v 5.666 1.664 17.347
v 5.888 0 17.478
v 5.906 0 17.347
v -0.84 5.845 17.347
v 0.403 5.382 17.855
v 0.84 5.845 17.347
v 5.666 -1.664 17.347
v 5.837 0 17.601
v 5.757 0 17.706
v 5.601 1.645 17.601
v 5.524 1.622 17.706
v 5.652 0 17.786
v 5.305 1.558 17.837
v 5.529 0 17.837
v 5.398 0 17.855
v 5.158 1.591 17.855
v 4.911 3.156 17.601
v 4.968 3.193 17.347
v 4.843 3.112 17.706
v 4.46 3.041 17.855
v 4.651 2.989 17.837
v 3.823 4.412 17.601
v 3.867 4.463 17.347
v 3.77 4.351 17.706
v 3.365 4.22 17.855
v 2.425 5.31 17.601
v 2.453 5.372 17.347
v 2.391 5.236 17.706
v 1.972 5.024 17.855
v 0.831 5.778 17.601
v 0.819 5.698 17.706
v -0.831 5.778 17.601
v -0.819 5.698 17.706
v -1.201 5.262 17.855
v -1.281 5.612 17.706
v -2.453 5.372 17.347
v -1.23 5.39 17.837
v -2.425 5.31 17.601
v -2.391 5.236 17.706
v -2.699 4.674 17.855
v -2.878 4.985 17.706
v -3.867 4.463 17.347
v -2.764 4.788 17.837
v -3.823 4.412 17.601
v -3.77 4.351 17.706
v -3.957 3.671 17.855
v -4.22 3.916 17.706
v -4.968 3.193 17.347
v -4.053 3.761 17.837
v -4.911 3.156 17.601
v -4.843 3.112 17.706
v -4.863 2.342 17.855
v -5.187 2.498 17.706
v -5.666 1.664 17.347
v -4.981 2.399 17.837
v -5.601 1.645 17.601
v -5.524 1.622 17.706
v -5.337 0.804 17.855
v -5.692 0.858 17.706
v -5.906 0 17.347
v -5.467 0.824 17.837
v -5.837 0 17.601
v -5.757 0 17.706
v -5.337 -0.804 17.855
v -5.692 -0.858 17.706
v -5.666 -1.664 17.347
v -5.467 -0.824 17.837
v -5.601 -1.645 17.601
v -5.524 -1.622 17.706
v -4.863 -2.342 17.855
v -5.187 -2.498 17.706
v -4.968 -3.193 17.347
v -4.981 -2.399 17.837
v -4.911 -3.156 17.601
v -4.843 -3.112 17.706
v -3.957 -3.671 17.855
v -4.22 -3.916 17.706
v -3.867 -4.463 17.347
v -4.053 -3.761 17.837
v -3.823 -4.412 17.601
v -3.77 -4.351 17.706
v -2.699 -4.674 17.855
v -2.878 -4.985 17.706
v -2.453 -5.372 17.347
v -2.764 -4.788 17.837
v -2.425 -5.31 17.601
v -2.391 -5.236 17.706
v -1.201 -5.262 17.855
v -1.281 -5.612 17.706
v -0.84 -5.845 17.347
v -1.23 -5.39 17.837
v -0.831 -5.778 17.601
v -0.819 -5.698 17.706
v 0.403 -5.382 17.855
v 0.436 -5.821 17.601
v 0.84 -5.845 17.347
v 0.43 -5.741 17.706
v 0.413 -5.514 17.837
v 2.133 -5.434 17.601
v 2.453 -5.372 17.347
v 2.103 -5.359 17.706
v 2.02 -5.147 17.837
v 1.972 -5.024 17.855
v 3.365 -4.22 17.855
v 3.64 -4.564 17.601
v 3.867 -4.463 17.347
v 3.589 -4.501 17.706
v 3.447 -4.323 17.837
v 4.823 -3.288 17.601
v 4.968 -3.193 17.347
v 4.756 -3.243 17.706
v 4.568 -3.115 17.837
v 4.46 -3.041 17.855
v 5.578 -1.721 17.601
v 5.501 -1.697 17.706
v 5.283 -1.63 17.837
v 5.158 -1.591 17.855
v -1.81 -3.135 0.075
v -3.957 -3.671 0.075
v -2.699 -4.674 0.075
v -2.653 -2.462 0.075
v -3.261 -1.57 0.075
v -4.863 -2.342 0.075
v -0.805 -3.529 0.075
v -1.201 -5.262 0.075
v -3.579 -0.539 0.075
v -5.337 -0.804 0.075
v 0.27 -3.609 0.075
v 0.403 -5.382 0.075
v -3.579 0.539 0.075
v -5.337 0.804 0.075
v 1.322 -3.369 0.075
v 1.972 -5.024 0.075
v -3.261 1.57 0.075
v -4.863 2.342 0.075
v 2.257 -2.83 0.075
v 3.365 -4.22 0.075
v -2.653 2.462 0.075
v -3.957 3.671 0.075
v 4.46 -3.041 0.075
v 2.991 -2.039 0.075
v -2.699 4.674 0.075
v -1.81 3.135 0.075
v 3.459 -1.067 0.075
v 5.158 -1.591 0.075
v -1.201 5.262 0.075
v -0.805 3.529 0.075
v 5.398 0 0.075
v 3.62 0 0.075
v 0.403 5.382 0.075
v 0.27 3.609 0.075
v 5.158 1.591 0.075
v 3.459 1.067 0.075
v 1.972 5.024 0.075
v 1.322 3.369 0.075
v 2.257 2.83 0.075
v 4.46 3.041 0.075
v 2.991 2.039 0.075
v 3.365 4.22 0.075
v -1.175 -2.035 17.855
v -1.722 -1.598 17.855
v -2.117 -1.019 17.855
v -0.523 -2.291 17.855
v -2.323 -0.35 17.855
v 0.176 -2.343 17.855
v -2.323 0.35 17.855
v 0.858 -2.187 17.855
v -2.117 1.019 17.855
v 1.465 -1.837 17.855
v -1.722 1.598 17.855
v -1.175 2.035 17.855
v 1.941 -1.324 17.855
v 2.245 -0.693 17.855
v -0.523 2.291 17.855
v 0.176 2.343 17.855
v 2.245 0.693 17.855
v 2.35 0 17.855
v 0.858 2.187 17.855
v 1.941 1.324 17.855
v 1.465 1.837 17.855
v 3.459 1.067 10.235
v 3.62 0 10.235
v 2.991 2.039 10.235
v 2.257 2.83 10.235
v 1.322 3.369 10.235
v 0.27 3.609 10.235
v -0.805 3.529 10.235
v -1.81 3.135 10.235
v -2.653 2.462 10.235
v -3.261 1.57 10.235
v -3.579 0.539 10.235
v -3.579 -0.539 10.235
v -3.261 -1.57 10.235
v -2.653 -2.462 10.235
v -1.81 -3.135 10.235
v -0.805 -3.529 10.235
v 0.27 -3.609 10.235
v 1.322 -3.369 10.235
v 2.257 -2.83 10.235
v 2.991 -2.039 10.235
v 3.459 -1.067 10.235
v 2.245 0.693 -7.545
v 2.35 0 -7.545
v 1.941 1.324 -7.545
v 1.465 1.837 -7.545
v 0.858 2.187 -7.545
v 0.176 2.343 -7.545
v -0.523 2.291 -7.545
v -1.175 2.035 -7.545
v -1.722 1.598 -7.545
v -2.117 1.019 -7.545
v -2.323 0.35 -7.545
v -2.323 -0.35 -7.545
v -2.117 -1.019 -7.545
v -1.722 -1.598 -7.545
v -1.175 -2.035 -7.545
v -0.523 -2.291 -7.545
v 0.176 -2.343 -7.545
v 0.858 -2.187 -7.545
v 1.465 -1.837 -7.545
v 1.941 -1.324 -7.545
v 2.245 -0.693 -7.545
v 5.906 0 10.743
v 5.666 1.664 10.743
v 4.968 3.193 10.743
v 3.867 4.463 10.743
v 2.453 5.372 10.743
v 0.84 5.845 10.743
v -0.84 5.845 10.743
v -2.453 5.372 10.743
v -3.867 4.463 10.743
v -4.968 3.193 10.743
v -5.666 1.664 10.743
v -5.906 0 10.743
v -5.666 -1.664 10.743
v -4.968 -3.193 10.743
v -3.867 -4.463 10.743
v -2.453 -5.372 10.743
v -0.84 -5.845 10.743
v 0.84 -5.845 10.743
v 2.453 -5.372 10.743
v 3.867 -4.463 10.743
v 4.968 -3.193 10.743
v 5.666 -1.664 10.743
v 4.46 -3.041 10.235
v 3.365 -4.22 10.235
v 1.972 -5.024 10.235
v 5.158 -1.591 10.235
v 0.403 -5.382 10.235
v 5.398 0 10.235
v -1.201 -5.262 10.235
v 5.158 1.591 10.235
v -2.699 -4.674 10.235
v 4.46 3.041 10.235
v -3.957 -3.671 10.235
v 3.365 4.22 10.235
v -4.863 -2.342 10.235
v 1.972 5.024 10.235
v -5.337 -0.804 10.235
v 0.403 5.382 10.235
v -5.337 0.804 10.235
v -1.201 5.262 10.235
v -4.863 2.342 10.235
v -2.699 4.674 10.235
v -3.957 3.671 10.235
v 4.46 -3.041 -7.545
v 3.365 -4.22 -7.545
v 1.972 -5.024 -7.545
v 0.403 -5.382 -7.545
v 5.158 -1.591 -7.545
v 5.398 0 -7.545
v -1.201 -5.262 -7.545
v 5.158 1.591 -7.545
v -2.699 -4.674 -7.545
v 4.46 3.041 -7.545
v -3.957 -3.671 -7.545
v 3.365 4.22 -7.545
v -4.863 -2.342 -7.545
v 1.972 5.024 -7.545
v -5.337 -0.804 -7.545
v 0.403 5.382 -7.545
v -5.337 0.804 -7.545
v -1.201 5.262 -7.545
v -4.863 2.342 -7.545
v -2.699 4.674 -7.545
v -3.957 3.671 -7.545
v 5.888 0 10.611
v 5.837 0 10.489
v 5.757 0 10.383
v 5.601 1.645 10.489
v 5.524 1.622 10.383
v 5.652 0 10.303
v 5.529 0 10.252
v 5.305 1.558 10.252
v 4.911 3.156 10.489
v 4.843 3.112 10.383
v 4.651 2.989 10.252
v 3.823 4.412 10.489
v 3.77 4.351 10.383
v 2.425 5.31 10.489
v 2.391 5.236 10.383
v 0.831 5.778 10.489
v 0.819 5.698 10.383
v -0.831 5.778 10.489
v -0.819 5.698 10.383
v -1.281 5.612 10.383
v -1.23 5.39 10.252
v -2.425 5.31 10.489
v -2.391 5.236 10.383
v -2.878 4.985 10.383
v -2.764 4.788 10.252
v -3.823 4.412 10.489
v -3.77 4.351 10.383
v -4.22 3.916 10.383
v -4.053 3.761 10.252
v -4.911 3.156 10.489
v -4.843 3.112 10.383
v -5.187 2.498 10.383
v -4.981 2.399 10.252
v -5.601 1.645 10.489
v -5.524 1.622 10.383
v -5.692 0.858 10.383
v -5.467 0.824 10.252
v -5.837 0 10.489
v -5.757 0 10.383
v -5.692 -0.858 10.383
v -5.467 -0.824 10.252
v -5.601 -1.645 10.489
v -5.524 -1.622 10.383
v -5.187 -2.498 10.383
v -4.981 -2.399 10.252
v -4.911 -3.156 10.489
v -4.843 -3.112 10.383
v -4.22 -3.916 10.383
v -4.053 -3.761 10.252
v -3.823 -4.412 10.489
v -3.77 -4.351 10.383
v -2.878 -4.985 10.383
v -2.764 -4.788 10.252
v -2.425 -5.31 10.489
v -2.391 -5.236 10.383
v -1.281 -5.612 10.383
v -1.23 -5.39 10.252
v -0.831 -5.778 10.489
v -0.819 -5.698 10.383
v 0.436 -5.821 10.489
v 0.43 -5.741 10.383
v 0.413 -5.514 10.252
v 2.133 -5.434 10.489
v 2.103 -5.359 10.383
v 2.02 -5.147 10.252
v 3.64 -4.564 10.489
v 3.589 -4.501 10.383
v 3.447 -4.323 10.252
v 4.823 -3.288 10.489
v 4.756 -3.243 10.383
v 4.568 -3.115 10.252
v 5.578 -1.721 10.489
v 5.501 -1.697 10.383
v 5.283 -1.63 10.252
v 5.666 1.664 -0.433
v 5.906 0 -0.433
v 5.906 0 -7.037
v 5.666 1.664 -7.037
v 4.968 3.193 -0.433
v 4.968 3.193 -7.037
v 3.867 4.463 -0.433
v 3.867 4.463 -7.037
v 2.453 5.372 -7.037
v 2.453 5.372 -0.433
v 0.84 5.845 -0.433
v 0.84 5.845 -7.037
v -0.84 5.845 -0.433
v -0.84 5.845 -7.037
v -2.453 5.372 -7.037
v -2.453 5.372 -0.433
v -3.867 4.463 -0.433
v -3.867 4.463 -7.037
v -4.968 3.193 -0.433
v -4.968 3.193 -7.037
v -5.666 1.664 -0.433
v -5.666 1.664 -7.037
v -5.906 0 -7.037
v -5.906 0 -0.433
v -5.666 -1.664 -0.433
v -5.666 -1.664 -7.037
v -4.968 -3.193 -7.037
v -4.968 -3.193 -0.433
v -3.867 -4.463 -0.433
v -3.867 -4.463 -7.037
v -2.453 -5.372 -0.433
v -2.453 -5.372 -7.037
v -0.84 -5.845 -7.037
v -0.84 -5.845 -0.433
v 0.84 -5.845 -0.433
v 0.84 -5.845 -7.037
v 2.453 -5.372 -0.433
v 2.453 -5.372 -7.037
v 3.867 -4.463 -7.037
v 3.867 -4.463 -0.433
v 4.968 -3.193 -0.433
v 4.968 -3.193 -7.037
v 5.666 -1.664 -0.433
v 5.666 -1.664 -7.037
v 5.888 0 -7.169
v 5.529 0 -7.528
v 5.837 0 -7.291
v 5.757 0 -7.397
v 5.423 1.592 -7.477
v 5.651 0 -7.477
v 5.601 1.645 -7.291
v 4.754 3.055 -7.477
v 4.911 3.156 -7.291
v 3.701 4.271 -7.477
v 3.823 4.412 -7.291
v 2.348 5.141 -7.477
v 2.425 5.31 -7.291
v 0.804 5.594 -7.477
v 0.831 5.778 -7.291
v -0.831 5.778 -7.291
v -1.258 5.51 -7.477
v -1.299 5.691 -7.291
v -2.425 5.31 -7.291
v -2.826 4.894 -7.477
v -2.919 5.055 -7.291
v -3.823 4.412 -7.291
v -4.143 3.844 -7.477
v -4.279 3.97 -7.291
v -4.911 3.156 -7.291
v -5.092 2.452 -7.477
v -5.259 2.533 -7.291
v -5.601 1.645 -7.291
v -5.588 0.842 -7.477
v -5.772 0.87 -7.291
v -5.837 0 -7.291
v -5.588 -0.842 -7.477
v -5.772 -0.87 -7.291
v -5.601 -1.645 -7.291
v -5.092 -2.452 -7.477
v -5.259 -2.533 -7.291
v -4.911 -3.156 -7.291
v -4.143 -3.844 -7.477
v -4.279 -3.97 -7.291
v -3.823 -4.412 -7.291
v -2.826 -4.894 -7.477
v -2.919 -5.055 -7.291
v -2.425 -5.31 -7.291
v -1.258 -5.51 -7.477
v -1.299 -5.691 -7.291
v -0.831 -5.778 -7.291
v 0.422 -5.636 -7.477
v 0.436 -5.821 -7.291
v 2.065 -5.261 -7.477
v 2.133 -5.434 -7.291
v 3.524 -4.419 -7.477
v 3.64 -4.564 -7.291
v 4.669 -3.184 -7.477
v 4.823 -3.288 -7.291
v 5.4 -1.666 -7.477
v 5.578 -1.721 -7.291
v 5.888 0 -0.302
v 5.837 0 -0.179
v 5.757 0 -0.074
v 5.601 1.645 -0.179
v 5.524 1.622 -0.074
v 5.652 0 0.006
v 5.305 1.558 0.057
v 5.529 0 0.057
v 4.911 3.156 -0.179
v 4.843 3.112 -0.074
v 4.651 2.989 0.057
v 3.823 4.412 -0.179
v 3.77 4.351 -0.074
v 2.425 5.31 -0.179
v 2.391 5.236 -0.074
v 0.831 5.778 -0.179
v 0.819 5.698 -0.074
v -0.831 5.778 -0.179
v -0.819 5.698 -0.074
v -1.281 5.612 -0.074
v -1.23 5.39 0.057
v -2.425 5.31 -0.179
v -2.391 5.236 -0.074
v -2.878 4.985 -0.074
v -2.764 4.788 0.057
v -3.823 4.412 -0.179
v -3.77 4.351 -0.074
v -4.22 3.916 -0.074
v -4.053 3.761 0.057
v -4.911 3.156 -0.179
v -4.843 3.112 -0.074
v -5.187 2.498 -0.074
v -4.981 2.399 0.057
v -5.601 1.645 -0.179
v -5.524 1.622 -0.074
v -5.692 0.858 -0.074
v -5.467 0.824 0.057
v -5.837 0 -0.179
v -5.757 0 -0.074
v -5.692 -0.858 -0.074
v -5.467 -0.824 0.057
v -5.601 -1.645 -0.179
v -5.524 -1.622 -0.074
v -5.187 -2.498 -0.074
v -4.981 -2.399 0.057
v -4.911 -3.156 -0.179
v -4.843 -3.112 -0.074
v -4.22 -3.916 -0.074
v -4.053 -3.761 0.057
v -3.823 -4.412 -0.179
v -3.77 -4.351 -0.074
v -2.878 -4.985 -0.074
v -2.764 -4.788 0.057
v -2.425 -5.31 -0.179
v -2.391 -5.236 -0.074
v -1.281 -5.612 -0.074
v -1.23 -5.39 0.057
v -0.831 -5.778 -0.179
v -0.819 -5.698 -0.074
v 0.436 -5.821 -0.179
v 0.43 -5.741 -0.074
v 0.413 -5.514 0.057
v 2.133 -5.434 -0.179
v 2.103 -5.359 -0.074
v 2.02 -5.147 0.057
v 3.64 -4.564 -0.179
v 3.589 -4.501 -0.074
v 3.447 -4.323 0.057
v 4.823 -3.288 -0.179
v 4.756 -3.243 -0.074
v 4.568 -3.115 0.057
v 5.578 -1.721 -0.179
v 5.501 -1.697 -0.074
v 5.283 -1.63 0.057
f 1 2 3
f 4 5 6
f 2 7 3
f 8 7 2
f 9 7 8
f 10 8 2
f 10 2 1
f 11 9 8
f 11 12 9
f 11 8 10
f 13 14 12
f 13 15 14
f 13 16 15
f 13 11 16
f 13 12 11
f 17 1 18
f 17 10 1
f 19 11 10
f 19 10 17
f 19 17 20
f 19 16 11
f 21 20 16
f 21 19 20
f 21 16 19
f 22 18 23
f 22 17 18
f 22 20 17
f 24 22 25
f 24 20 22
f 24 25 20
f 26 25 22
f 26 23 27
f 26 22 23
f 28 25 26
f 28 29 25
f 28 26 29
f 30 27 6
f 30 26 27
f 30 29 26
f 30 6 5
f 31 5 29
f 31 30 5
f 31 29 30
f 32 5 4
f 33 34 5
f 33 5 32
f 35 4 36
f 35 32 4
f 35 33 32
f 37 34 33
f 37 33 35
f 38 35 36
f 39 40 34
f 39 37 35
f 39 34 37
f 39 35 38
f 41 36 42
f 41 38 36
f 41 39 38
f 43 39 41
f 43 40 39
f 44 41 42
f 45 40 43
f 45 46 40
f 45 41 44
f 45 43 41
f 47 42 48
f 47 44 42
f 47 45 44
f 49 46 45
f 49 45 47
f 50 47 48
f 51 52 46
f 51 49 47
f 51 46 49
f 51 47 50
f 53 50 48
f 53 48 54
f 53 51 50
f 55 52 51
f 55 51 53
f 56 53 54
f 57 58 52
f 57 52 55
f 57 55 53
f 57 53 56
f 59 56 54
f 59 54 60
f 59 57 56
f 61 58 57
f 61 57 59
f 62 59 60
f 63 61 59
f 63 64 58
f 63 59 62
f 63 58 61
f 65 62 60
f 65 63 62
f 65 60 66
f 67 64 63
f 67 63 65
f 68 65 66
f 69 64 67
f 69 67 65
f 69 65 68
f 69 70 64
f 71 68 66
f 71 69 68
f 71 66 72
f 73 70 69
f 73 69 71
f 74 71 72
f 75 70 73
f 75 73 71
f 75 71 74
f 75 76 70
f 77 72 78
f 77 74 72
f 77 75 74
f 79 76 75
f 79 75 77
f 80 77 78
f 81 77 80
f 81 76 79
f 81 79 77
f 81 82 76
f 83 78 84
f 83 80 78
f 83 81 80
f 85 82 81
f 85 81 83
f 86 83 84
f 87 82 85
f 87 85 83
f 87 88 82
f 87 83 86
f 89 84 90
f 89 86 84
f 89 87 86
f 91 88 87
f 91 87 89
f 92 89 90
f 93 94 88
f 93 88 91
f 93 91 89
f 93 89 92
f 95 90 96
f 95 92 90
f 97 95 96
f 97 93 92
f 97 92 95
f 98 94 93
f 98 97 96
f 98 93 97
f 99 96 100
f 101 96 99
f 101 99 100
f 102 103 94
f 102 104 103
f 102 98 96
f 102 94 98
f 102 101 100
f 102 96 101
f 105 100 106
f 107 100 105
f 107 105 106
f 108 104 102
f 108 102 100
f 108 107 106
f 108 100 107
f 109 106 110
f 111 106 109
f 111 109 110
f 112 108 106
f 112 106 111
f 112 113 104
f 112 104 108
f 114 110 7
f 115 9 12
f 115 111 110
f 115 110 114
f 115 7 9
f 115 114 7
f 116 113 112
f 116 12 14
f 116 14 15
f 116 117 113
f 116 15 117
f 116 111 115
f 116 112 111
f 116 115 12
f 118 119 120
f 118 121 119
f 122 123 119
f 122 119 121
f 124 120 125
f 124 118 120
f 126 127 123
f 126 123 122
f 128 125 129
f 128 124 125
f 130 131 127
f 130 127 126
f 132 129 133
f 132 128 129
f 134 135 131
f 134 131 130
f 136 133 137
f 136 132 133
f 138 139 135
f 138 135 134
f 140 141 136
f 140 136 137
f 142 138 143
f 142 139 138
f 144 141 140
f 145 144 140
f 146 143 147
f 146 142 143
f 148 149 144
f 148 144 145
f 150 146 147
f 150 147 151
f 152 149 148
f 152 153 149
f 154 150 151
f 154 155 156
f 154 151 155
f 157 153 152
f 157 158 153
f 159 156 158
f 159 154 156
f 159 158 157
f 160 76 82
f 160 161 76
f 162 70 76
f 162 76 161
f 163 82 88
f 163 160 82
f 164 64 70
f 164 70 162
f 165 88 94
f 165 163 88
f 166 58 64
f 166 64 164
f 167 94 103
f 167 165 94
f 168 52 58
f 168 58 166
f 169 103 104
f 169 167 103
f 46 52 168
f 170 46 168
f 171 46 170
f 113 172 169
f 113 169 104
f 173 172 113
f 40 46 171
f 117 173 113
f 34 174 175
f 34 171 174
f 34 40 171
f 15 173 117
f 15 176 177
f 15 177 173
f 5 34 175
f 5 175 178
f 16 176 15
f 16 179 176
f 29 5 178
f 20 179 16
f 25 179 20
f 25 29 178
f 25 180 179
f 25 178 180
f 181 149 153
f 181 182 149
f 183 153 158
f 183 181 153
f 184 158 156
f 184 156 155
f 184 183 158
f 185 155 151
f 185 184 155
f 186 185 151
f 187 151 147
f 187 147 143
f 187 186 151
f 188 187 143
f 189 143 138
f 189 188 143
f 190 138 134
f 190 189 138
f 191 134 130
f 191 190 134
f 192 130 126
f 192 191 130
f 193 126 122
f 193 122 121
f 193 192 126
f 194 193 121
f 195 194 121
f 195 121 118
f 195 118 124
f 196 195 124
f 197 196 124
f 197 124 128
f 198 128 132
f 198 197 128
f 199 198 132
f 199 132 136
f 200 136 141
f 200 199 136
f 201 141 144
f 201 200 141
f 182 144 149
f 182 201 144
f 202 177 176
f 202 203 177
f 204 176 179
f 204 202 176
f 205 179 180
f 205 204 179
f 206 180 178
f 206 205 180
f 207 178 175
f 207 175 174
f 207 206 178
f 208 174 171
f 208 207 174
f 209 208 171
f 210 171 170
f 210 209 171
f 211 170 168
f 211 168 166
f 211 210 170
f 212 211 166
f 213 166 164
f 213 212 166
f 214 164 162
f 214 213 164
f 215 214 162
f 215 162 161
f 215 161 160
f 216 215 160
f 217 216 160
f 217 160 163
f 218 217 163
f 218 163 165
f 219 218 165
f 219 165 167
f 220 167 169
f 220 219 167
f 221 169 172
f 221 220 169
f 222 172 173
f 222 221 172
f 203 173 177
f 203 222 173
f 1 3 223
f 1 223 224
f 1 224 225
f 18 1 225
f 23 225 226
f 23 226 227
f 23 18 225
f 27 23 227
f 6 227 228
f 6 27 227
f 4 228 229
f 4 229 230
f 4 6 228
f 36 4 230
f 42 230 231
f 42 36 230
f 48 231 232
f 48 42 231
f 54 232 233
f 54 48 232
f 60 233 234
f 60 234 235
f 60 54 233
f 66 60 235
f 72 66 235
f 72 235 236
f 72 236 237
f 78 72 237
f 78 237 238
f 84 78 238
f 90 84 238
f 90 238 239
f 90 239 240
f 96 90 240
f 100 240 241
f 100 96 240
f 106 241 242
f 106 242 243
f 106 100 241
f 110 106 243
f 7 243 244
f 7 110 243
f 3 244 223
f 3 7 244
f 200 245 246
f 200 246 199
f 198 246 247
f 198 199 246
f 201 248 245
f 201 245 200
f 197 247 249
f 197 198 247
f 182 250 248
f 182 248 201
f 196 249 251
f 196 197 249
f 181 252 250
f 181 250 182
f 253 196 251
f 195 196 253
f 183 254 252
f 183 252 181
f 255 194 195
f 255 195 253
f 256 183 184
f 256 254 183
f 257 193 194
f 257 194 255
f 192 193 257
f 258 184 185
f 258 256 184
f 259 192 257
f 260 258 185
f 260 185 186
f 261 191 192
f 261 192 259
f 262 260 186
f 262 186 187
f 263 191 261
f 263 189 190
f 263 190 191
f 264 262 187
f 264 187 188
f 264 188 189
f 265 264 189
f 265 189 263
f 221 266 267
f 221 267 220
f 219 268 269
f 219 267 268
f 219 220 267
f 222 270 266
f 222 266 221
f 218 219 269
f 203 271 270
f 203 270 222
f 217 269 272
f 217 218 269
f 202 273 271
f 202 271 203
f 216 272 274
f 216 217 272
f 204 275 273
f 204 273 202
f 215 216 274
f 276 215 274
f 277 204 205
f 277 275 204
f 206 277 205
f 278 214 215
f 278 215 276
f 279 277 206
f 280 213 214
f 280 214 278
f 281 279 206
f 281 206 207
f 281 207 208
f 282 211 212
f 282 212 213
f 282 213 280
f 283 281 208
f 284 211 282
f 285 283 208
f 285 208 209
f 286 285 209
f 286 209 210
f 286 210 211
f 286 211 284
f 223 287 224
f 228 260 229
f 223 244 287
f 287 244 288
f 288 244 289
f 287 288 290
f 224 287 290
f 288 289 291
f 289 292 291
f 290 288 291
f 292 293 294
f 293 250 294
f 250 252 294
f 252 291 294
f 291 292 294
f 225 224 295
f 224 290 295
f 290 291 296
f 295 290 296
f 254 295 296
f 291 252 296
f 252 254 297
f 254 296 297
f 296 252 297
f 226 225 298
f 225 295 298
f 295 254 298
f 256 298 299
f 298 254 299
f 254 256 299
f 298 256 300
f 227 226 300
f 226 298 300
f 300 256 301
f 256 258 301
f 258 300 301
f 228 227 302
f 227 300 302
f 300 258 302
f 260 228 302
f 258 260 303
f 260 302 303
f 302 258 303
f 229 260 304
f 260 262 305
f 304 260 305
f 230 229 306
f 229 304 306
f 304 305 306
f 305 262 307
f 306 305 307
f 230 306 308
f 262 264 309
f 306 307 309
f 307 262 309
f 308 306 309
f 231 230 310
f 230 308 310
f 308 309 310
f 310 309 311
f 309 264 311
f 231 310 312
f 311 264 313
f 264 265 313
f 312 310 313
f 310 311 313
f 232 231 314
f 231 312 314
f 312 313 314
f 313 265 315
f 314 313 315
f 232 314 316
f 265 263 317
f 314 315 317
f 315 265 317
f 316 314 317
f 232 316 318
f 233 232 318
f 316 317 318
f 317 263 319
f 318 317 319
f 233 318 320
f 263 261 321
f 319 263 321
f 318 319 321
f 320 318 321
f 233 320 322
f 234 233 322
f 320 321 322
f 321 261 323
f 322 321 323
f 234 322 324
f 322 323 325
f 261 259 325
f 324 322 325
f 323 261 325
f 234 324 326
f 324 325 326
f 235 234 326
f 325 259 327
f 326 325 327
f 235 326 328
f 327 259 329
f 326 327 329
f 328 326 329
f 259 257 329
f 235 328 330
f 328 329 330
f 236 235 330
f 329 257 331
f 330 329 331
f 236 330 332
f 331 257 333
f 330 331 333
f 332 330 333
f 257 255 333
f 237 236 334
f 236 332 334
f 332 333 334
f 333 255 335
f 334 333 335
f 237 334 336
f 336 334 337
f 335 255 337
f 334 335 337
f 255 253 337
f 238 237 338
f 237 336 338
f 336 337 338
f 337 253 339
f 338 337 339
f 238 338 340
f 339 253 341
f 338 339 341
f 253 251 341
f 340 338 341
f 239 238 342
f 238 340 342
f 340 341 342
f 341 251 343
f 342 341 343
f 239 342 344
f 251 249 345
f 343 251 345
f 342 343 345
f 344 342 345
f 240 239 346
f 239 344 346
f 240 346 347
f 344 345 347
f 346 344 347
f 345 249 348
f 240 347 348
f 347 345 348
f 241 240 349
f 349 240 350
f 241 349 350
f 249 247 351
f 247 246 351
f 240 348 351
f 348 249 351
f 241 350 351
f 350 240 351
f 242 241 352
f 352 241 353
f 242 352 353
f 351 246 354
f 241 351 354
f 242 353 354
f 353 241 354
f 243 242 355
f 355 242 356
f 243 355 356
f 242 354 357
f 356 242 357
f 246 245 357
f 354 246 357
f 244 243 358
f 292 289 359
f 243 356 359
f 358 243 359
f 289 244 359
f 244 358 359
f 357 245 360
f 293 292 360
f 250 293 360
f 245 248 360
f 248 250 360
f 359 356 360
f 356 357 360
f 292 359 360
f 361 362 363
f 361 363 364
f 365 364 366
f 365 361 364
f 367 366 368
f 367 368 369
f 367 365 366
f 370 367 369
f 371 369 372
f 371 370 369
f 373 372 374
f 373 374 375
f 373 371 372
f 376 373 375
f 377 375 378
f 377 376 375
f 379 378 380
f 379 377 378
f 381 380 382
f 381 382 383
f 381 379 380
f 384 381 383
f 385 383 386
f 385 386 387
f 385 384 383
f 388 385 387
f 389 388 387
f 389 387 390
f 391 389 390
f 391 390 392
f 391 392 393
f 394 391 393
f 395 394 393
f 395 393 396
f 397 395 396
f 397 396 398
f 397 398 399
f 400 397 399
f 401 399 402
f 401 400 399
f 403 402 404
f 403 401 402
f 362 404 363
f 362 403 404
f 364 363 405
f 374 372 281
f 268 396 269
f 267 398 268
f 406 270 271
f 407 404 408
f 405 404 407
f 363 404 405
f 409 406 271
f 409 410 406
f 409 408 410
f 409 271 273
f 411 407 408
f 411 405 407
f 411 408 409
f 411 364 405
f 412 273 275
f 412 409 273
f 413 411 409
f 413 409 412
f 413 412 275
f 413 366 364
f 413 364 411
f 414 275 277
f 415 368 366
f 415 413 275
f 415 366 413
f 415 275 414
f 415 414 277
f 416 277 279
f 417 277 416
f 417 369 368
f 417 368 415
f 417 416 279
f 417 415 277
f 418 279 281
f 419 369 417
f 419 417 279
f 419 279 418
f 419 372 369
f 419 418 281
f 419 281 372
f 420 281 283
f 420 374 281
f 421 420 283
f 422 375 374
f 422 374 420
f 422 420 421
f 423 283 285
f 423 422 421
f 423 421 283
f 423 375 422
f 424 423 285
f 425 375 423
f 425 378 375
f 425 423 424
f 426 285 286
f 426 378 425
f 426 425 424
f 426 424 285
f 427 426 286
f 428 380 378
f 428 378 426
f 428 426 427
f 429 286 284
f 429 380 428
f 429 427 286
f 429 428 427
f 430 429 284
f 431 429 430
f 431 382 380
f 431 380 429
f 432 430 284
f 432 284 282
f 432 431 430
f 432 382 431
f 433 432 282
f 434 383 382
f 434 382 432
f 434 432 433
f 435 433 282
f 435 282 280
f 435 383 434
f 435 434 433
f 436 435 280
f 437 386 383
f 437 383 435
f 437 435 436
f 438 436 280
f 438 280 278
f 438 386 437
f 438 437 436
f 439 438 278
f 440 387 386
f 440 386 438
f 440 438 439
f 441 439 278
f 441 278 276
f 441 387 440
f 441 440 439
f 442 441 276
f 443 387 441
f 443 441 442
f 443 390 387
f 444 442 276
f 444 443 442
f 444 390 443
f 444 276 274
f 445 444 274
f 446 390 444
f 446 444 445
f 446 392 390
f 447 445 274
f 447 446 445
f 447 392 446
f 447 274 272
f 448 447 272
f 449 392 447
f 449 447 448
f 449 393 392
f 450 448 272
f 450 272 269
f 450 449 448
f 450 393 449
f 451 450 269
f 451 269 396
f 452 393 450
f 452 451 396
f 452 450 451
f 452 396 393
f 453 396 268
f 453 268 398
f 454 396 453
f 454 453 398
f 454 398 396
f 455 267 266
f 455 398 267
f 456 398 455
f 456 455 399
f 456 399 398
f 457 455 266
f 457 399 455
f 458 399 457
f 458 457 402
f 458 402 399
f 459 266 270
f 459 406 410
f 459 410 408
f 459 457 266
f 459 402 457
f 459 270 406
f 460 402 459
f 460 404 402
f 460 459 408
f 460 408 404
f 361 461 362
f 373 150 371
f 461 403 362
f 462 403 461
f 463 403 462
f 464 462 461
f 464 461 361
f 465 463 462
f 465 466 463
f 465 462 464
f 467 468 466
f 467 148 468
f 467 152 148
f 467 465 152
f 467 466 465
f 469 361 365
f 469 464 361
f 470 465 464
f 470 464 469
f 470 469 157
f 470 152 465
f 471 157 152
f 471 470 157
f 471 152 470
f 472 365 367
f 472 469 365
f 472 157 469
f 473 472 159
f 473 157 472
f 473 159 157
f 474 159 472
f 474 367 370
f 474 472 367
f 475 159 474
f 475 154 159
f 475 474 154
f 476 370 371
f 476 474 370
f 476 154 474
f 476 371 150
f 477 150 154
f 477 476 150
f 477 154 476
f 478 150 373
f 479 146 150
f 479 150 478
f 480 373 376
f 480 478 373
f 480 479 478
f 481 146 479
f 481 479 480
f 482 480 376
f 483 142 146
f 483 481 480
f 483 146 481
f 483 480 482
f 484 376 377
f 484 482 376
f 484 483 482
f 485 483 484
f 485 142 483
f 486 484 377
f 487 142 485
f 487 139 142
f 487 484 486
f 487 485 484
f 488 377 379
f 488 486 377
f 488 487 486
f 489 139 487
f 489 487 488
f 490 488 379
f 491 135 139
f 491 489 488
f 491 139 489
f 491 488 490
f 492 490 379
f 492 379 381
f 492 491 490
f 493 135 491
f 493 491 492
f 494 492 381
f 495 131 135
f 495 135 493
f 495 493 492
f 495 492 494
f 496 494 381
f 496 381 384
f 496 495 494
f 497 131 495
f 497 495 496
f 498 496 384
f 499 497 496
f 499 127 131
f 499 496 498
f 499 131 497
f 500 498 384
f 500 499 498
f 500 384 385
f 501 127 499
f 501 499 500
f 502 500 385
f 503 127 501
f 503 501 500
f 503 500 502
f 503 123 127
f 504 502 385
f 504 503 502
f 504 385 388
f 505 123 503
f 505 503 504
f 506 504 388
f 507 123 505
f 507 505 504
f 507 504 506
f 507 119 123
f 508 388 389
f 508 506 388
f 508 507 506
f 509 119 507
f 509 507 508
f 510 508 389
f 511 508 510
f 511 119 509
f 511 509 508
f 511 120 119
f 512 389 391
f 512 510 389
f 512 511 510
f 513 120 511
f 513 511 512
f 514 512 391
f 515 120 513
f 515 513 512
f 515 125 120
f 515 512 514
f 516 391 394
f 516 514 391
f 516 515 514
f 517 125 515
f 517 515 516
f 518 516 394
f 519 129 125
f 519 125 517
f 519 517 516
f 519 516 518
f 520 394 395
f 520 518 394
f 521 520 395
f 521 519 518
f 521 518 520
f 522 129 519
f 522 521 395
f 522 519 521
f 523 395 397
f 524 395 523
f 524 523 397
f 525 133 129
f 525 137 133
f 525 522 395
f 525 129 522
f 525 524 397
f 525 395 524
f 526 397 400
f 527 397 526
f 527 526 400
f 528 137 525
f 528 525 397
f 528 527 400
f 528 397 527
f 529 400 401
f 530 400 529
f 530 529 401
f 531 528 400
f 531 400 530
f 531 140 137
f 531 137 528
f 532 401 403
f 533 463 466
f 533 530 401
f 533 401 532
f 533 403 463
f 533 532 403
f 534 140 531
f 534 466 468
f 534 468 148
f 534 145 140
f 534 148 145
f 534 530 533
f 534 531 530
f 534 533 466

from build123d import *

# Parameters (mm, degrees)
F2_R = 0.508
F3_R = 0.508


with BuildPart() as f1:
    # F0 (on Front) → F1 (revolve)
    with BuildSketch(Plane.XZ):
        Polygon((5.9055, 10.234522), (5.9055, 17.854522), (2.3495, 17.854522), (2.3495, -7.545478), (5.9055, -7.545478), (5.9055, 0.074522), (3.6195, 0.074522), (3.6195, 10.234522), align=None)
    revolve(axis=Axis((0, 0, 1.306427), (0, 0, 1)))

    # F2
    f2_edges = [f1.edges().sort_by_distance(p)[0] for p in [
        (-5.9055, 0, 17.854522),
        (-5.9055, 0, 10.234522),
        (-5.9055, 0, 0.074522),
    ]]
    fillet(f2_edges, radius=F2_R)

    # F3
    f3_edges = [f1.edges().sort_by_distance(p)[0] for p in [
        (-5.9055, 0, -7.545478),
    ]]
    fillet(f3_edges, radius=F3_R)


solid = f1.part
